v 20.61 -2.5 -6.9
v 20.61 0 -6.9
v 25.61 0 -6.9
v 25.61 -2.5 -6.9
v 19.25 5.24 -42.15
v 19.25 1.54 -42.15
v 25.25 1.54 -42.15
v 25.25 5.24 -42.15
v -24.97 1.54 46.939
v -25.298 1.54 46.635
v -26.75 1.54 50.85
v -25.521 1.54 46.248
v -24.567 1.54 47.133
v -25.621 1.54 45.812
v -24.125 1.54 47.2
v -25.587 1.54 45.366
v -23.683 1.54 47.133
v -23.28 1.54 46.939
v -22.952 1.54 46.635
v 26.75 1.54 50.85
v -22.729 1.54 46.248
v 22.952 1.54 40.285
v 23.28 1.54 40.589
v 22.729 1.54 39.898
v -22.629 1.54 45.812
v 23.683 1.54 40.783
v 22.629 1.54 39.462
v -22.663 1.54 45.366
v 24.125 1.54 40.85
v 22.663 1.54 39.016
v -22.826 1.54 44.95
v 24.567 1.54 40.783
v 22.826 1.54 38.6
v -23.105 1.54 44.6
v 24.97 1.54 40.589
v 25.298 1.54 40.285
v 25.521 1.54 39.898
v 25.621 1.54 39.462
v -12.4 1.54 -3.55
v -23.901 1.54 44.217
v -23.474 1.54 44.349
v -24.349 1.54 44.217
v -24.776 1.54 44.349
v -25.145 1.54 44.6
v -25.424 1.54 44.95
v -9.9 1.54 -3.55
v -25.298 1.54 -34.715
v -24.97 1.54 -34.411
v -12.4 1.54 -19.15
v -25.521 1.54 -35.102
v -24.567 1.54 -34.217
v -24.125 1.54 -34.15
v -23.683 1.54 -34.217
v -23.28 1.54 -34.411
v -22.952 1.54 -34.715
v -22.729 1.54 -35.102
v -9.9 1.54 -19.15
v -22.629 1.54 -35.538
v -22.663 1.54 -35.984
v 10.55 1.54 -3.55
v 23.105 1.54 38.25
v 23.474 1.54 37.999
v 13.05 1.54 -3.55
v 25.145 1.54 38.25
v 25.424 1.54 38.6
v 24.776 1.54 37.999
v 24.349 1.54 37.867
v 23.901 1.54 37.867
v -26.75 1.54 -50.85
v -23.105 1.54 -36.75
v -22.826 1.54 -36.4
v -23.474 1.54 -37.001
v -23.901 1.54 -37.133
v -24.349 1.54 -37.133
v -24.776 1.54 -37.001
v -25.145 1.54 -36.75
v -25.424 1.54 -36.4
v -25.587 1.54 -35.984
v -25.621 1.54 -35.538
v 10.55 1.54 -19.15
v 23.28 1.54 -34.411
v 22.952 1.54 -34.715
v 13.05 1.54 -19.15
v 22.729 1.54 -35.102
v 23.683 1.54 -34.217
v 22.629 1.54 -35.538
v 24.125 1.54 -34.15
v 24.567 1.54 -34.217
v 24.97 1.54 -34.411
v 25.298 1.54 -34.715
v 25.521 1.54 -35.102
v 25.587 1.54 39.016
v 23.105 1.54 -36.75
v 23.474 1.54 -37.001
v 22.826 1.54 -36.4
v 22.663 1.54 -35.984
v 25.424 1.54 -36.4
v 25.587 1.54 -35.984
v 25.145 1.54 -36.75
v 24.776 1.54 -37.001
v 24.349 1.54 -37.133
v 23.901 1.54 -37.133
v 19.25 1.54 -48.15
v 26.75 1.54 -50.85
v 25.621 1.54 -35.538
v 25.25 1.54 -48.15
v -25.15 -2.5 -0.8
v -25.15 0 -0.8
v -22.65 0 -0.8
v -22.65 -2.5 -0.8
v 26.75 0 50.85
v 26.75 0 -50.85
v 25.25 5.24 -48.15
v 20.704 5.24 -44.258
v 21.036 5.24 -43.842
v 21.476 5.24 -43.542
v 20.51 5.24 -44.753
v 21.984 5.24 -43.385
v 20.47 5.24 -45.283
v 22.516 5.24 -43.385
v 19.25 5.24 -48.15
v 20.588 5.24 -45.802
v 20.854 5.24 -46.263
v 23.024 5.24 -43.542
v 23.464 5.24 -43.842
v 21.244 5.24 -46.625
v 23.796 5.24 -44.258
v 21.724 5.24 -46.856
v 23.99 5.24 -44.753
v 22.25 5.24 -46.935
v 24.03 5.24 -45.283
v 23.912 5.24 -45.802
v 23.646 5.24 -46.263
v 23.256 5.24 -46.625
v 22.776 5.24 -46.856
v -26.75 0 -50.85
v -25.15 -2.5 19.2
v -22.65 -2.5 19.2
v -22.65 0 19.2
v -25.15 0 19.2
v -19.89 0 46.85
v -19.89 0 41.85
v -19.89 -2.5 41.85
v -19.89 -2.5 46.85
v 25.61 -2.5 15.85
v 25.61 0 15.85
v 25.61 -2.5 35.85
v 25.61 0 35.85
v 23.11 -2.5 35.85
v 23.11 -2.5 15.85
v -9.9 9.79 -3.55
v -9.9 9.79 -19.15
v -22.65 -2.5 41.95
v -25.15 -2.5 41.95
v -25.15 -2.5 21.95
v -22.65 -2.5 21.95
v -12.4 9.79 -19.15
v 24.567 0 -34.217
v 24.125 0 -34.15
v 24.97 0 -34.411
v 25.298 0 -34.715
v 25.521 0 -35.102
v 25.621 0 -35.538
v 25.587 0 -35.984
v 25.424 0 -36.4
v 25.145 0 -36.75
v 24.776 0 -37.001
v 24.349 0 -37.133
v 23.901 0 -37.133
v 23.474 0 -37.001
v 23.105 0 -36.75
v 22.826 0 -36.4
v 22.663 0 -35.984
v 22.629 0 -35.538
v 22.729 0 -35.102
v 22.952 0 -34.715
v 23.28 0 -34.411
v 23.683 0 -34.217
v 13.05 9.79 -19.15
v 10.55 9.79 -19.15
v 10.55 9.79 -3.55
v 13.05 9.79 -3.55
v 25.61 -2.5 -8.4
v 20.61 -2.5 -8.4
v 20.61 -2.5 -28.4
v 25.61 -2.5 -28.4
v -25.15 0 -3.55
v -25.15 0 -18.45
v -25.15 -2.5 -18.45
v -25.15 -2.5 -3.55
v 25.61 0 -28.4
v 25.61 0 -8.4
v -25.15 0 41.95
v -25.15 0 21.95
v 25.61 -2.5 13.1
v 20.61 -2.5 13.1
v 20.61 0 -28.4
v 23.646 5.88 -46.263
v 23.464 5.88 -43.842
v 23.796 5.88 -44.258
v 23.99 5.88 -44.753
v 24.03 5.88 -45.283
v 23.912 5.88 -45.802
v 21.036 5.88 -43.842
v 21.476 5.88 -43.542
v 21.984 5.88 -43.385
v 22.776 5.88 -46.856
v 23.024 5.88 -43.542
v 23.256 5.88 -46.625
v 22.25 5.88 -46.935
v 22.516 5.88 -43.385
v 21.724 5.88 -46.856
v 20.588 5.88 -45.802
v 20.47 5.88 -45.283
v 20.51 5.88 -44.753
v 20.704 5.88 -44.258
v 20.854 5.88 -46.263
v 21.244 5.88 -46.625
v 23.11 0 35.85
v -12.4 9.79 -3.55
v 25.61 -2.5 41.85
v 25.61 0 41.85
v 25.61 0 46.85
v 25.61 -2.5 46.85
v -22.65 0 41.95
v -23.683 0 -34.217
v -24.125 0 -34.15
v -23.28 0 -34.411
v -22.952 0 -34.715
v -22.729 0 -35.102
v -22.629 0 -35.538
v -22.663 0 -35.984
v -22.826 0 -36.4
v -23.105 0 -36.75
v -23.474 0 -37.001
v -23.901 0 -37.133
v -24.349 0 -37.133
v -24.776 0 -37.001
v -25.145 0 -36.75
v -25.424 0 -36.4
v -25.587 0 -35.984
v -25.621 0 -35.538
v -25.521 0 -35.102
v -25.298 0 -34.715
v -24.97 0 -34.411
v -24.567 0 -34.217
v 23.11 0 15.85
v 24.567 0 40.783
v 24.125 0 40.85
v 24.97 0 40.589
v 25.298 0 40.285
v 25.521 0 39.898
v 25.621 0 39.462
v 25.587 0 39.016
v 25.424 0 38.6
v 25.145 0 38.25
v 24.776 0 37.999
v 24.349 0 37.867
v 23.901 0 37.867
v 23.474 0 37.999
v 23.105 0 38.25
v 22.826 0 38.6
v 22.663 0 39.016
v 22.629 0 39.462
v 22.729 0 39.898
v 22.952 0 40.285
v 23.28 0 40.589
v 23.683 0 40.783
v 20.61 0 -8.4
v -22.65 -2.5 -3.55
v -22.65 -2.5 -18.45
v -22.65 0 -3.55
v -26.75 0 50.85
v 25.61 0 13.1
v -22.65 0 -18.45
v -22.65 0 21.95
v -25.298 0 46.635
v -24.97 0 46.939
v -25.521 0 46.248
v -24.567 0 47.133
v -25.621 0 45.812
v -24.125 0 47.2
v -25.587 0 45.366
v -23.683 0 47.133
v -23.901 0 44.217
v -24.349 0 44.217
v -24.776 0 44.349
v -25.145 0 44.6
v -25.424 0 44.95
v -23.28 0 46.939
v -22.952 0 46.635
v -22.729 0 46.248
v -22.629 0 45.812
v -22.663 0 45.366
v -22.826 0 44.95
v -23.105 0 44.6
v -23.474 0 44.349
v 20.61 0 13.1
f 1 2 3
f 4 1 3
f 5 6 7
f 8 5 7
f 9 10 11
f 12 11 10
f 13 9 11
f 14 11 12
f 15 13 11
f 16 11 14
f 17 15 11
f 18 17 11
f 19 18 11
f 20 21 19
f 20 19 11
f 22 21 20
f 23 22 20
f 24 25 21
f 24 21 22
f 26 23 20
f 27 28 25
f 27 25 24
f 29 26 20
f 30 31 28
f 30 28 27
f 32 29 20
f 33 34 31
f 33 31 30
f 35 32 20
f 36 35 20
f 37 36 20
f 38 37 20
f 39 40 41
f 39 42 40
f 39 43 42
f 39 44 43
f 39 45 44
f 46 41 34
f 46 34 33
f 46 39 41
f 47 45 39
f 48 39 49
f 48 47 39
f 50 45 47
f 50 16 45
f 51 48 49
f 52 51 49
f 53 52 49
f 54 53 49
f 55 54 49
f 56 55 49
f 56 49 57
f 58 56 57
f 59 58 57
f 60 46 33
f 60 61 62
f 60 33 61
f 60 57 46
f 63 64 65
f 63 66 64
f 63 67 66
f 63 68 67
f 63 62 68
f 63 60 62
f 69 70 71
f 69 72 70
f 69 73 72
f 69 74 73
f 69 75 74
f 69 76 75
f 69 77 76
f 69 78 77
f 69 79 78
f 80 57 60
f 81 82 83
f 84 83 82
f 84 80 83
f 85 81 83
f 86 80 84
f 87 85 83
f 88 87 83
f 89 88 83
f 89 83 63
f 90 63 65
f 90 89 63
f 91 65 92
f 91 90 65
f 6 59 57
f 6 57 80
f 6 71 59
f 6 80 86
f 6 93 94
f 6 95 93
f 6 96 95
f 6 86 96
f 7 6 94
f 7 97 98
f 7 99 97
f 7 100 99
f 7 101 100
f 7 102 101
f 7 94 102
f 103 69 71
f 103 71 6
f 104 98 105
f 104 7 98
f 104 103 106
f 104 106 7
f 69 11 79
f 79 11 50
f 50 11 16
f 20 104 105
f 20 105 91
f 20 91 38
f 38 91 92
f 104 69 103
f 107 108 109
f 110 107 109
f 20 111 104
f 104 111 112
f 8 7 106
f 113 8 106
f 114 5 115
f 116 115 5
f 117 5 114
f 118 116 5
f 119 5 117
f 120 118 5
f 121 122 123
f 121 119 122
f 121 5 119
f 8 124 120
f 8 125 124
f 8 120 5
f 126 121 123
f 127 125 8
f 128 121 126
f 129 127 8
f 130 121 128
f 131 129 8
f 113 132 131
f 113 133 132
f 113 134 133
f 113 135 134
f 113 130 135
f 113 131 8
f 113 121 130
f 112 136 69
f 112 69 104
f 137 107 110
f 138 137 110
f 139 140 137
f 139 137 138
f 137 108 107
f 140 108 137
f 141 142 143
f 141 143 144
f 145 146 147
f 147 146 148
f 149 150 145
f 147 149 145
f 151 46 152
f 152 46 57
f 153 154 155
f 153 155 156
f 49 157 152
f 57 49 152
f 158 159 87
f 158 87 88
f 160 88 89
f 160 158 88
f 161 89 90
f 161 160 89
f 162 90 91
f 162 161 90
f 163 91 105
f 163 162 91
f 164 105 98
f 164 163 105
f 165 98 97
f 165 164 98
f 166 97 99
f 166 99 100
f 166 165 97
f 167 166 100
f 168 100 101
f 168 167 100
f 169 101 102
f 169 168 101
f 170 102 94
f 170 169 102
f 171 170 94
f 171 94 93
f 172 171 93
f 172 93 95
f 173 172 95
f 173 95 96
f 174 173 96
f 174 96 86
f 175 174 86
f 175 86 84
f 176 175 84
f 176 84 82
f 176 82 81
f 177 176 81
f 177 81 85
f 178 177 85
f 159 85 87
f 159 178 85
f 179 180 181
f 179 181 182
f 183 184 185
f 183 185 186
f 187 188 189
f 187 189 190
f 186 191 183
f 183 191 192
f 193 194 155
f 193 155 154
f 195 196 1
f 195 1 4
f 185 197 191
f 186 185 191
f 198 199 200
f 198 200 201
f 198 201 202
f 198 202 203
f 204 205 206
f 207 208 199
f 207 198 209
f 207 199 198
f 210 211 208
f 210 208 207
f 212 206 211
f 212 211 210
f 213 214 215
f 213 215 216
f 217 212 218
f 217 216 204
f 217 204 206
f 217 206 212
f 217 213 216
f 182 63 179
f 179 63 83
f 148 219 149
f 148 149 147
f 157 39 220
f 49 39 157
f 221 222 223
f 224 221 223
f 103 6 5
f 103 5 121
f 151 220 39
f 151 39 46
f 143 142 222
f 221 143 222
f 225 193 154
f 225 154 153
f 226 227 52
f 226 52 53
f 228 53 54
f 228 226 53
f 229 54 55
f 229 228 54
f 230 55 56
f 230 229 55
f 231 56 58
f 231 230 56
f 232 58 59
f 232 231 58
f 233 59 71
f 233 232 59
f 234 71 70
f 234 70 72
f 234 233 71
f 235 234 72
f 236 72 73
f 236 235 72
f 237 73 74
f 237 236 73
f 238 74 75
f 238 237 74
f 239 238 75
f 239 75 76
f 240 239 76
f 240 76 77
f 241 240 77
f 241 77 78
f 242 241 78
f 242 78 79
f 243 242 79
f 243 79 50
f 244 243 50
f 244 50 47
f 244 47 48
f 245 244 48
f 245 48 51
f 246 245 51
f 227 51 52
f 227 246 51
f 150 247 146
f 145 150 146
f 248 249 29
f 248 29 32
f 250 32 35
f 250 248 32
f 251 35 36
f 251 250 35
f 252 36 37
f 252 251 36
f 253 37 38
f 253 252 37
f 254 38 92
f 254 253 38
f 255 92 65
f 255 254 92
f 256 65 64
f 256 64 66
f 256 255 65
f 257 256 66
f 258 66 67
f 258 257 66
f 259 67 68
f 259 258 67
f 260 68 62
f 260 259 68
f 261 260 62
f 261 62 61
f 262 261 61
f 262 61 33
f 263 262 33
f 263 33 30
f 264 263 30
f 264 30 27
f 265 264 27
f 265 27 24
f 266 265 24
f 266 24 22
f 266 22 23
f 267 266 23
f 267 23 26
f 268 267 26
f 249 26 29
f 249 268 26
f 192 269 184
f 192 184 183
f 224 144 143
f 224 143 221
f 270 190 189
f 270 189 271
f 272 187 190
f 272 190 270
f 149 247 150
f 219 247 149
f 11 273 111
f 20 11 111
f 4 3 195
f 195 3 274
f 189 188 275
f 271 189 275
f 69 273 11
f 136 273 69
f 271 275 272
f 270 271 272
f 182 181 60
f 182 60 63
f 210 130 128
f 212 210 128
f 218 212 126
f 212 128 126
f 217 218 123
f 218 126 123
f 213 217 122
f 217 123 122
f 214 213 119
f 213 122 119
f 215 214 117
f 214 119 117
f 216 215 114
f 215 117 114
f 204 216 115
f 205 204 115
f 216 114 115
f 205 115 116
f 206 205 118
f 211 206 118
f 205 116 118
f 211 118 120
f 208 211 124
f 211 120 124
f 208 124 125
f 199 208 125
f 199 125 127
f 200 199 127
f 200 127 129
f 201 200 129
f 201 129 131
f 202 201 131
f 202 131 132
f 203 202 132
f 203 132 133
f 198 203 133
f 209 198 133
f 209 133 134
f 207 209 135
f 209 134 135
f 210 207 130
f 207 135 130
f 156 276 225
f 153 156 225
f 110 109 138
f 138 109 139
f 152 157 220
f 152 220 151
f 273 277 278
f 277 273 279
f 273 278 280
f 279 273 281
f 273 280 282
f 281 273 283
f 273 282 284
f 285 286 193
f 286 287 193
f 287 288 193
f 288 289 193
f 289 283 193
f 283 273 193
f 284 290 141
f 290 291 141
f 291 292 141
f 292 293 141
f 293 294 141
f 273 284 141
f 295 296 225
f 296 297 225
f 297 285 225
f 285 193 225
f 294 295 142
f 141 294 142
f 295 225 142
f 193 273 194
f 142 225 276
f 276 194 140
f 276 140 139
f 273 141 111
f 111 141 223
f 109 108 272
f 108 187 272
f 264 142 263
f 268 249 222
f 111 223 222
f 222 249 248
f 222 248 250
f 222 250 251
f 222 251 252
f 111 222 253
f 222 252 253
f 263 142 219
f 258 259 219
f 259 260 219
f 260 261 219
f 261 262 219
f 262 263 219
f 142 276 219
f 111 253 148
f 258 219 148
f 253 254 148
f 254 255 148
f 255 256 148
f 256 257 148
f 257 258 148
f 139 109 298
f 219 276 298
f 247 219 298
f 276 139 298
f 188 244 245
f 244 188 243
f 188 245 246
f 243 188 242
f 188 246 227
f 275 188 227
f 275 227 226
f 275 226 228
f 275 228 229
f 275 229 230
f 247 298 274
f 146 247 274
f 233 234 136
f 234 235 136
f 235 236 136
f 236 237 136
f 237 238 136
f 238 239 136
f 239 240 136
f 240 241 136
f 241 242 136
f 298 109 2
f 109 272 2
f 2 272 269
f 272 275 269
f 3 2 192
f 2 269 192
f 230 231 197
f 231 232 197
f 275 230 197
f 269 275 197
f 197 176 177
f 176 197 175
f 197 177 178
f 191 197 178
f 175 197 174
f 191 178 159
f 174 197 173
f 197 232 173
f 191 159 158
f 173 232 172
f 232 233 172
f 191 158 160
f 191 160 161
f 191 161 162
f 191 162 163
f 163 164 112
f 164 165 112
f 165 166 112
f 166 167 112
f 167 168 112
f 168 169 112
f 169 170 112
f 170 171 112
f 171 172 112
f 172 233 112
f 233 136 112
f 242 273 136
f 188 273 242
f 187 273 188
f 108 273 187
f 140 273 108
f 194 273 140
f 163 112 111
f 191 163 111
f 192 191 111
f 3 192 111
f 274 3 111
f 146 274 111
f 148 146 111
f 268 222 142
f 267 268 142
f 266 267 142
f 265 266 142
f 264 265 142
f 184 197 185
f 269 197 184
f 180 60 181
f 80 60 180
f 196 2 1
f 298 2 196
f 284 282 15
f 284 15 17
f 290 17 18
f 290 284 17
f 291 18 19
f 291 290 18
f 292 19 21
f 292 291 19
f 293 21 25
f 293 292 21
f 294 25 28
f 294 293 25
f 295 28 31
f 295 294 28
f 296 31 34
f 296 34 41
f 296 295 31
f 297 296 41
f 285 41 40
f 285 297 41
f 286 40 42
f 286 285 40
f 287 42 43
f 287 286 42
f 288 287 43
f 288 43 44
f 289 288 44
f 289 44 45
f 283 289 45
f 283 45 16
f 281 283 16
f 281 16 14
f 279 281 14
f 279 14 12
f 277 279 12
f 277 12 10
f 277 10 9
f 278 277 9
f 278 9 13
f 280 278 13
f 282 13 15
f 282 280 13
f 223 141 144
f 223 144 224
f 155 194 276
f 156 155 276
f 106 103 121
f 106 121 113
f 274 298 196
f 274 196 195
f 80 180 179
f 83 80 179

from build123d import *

# Parameters (mm, degrees)
SKETCH1_W           = 53.5
SKETCH1_H           = 101.7
SKETCH1_R           = 1.5
BOSS_EXTRUDE1_DEPTH = 1.54
SKETCH2_W           = 2.5
SKETCH2_H           = 15.6
BOSS_EXTRUDE2_DEPTH = 8.25
SKETCH3_W           = 6
SKETCH3_H           = 6
BOSS_EXTRUDE3_DEPTH = 3.7
SKETCH5_R           = 1.785
BOSS_EXTRUDE5_DEPTH = 0.64
SKETCH4_W           = 45.5
SKETCH4_H           = 5
SKETCH4_W_2         = 2.5
SKETCH4_H_2         = 20
SKETCH4_W_3         = 5
SKETCH4_H_3         = 14.9
BOSS_EXTRUDE4_DEPTH = 2.5


with BuildPart() as part:
    # Sketch1 → Boss-Extrude1 (new body)
    with BuildSketch(Plane(origin=(0, 0, 0), x_dir=(1, 0, 0), z_dir=(0, 1, 0))):
        Rectangle(SKETCH1_W, SKETCH1_H)
        with Locations(Location((24.125, -39.35, 0), (0, 0, 270))):
            Circle(SKETCH1_R, mode=Mode.SUBTRACT)
        with Locations(Location((-24.125, -45.7, 0), (0, 0, 270))):
            Circle(SKETCH1_R, mode=Mode.SUBTRACT)
        with Locations(Location((24.125, 35.65, 0), (0, 0, 270))):
            Circle(SKETCH1_R, mode=Mode.SUBTRACT)
        with Locations(Location((-24.125, 35.65, 0), (0, 0, 270))):
            Circle(SKETCH1_R, mode=Mode.SUBTRACT)
    extrude(amount=BOSS_EXTRUDE1_DEPTH)

    # Sketch2 → Boss-Extrude2 (add)
    with BuildSketch(Plane(origin=(0, 1.54, 0), x_dir=(1, 0, 0), z_dir=(0, 1, 0))):
        with Locations((11.8, 11.35)):
            Rectangle(SKETCH2_W, SKETCH2_H)
        with Locations((-11.15, 11.35)):
            Rectangle(SKETCH2_W, SKETCH2_H)
    extrude(amount=BOSS_EXTRUDE2_DEPTH)

    # Sketch3 → Boss-Extrude3 (add)
    with BuildSketch(Plane(origin=(0, 1.54, 0), x_dir=(1, 0, 0), z_dir=(0, 1, 0))):
        with Locations((22.25, 45.15)):
            Rectangle(SKETCH3_W, SKETCH3_H)
    extrude(amount=BOSS_EXTRUDE3_DEPTH)

    # Sketch5 → Boss-Extrude5 (add)
    with BuildSketch(Plane(origin=(0, 5.24, 0), x_dir=(1, 0, 0), z_dir=(0, 1, 0))):
        with Locations(Location((22.25, 45.15, 0), (0, 0, 90))):
            Circle(SKETCH5_R)
    extrude(amount=BOSS_EXTRUDE5_DEPTH)

    # Sketch4 → Boss-Extrude4 (add)
    with BuildSketch(Plane.XZ):
        with Locations((2.86, 44.35)):
            Rectangle(SKETCH4_W, SKETCH4_H)
        with Locations((24.36, 25.85)):
            Rectangle(SKETCH4_W_2, SKETCH4_H_2)
        with Locations((23.11, 3.1)):
            Rectangle(SKETCH4_W_3, SKETCH4_H_2)
        with Locations((23.11, -18.4)):
            Rectangle(SKETCH4_W_3, SKETCH4_H_2)
        with Locations((-23.9, 31.95)):
            Rectangle(SKETCH4_W_2, SKETCH4_H_2)
        with Locations((-23.9, 9.2)):
            Rectangle(SKETCH4_W_2, SKETCH4_H_2)
        with Locations((-23.9, -11)):
            Rectangle(SKETCH4_W_2, SKETCH4_H_3)
    extrude(amount=BOSS_EXTRUDE4_DEPTH)


solid = part.part
